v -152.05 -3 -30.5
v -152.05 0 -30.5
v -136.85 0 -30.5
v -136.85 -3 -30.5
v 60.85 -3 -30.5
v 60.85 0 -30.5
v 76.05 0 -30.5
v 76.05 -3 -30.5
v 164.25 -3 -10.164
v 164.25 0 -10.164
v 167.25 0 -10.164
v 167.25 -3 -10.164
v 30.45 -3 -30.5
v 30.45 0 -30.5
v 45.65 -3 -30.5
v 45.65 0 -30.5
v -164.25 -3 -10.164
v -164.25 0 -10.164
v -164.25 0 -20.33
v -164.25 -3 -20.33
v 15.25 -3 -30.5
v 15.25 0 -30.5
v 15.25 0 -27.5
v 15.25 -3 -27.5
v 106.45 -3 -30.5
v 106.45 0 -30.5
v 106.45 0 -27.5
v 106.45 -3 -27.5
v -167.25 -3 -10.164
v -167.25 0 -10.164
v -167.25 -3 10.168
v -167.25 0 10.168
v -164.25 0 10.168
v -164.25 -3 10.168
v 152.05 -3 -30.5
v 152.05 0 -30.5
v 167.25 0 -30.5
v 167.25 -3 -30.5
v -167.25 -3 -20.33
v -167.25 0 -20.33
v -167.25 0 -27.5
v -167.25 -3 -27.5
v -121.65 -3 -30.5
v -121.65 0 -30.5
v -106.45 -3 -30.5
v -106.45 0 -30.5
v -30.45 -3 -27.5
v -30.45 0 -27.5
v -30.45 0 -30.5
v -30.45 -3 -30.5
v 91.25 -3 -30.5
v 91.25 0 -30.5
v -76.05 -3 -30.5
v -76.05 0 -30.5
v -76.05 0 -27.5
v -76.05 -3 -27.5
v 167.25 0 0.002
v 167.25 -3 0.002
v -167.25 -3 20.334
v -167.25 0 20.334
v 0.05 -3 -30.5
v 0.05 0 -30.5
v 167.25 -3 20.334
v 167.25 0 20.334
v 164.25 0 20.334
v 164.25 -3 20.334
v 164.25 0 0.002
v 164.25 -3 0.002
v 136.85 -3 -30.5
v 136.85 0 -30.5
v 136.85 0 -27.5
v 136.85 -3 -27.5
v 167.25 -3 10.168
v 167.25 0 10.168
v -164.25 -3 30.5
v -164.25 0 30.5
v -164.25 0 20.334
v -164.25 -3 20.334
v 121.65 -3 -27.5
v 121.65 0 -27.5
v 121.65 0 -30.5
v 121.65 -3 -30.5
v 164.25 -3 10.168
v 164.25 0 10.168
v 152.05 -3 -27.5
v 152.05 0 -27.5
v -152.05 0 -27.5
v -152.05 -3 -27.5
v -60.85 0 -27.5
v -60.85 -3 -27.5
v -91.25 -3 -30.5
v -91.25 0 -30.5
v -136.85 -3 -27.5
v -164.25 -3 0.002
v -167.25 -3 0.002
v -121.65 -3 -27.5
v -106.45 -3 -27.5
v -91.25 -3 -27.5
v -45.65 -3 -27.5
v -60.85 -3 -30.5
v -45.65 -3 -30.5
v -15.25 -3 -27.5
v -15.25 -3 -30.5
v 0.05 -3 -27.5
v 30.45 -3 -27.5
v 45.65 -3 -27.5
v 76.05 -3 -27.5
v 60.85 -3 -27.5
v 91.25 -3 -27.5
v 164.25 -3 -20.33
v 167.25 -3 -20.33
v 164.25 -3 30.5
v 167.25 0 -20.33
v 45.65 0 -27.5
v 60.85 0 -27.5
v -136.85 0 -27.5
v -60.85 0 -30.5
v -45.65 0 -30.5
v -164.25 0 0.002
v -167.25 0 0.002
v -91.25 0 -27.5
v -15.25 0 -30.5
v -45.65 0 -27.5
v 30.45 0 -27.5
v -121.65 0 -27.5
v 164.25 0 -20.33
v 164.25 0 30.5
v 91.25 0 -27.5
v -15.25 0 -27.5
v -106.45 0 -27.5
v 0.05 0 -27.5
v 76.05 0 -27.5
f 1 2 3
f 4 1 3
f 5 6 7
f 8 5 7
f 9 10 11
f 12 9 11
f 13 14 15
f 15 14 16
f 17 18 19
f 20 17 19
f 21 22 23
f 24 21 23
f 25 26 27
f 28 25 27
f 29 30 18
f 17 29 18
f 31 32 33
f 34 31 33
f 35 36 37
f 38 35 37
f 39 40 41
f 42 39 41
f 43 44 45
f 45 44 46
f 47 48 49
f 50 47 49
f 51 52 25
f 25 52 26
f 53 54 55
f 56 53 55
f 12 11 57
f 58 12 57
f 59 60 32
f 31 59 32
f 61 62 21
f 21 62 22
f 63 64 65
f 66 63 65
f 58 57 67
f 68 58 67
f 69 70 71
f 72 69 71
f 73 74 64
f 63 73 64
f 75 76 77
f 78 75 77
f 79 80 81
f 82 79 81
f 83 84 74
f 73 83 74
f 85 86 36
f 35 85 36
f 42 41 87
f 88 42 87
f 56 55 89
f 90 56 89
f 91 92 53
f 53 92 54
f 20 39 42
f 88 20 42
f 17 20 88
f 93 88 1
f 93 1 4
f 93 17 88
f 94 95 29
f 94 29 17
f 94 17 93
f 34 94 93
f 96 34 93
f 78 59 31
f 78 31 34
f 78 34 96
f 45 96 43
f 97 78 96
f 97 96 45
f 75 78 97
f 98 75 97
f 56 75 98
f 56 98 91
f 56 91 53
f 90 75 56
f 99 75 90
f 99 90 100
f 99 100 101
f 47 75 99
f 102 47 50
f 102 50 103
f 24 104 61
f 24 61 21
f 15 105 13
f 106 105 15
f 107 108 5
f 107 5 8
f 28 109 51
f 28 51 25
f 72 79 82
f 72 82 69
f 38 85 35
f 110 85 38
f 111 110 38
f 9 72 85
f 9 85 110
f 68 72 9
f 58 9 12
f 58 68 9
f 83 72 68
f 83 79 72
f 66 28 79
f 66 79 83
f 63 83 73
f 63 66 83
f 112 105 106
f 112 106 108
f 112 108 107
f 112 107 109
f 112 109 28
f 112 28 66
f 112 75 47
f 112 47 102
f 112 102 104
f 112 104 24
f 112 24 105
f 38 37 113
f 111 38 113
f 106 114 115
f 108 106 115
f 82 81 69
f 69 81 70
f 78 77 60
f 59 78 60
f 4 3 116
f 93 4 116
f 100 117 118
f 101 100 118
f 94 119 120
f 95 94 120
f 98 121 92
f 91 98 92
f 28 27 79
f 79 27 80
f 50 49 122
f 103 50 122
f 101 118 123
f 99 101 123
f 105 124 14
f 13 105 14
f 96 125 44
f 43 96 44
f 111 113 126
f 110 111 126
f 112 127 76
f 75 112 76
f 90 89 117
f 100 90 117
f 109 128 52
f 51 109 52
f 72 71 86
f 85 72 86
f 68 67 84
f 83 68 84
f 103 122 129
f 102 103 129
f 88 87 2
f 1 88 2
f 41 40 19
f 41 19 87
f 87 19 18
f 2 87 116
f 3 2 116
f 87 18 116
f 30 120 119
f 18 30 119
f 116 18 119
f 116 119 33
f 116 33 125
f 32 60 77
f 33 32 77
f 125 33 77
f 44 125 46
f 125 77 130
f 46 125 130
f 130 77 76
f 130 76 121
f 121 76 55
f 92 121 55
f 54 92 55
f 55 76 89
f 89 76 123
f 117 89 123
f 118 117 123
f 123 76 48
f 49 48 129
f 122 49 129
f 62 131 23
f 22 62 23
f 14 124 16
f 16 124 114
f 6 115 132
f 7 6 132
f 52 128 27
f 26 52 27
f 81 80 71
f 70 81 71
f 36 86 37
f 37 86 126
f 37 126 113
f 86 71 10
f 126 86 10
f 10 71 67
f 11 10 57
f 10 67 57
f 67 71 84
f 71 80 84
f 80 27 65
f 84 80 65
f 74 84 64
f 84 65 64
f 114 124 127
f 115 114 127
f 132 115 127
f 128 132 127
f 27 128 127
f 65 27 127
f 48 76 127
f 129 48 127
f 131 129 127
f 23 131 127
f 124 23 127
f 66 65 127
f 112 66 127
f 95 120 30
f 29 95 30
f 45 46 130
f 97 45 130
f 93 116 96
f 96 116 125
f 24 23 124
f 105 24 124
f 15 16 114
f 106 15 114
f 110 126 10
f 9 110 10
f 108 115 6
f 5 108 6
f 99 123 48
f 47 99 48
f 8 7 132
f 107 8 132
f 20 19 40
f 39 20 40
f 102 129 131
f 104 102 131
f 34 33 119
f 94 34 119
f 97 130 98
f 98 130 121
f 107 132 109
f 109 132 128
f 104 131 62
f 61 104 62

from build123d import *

# Parameters (mm, degrees)
F1_DEPTH = 3


with BuildPart() as f1:
    # F0 (on Front) → F1 (new body)
    with BuildSketch(Plane.XZ):
        Polygon((152.0495, -30.5), (167.2495, -30.5), (167.2495, -27.5), (167.2495, -20.33), (164.2495, -20.33), (164.2495, -10.164), (167.2495, -10.164), (167.2495, 0.002), (164.2495, 0.002), (164.2495, 10.168), (167.2495, 10.168), (167.2495, 20.334), (164.2495, 20.334), (164.2495, 30.5), (-164.2495, 30.5), (-164.2495, 20.334), (-167.2495, 20.334), (-167.2495, 10.168), (-164.2495, 10.168), (-164.2495, 0.002), (-167.2495, 0.002), (-167.2495, -10.164), (-164.2495, -10.164), (-164.2495, -20.33), (-167.2495, -20.33), (-167.2495, -27.5), (-152.0495, -27.5), (-152.0495, -30.5), (-136.8495, -30.5), (-136.8495, -27.5), (-121.6495, -27.5), (-121.6495, -30.5), (-106.4495, -30.5), (-106.4495, -27.5), (-91.2495, -27.5), (-91.2495, -30.5), (-76.0495, -30.5), (-76.0495, -27.5), (-60.8495, -27.5), (-60.8495, -30.5), (-45.6495, -30.5), (-45.6495, -27.5), (-30.4495, -27.5), (-30.4495, -30.5), (-15.2495, -30.5), (-15.2495, -27.5), (-0.0495, -27.5), (0.0495, -27.5), (0.0495, -30.5), (15.2495, -30.5), (15.2495, -27.5), (30.4495, -27.5), (30.4495, -30.5), (45.6495, -30.5), (45.6495, -27.5), (60.8495, -27.5), (60.8495, -30.5), (76.0495, -30.5), (76.0495, -27.5), (91.2495, -27.5), (91.2495, -30.5), (106.4495, -30.5), (106.4495, -27.5), (121.6495, -27.5), (121.6495, -30.5), (136.8495, -30.5), (136.8495, -27.5), (152.0495, -27.5), align=None)
    extrude(amount=F1_DEPTH)


solid = f1.part
